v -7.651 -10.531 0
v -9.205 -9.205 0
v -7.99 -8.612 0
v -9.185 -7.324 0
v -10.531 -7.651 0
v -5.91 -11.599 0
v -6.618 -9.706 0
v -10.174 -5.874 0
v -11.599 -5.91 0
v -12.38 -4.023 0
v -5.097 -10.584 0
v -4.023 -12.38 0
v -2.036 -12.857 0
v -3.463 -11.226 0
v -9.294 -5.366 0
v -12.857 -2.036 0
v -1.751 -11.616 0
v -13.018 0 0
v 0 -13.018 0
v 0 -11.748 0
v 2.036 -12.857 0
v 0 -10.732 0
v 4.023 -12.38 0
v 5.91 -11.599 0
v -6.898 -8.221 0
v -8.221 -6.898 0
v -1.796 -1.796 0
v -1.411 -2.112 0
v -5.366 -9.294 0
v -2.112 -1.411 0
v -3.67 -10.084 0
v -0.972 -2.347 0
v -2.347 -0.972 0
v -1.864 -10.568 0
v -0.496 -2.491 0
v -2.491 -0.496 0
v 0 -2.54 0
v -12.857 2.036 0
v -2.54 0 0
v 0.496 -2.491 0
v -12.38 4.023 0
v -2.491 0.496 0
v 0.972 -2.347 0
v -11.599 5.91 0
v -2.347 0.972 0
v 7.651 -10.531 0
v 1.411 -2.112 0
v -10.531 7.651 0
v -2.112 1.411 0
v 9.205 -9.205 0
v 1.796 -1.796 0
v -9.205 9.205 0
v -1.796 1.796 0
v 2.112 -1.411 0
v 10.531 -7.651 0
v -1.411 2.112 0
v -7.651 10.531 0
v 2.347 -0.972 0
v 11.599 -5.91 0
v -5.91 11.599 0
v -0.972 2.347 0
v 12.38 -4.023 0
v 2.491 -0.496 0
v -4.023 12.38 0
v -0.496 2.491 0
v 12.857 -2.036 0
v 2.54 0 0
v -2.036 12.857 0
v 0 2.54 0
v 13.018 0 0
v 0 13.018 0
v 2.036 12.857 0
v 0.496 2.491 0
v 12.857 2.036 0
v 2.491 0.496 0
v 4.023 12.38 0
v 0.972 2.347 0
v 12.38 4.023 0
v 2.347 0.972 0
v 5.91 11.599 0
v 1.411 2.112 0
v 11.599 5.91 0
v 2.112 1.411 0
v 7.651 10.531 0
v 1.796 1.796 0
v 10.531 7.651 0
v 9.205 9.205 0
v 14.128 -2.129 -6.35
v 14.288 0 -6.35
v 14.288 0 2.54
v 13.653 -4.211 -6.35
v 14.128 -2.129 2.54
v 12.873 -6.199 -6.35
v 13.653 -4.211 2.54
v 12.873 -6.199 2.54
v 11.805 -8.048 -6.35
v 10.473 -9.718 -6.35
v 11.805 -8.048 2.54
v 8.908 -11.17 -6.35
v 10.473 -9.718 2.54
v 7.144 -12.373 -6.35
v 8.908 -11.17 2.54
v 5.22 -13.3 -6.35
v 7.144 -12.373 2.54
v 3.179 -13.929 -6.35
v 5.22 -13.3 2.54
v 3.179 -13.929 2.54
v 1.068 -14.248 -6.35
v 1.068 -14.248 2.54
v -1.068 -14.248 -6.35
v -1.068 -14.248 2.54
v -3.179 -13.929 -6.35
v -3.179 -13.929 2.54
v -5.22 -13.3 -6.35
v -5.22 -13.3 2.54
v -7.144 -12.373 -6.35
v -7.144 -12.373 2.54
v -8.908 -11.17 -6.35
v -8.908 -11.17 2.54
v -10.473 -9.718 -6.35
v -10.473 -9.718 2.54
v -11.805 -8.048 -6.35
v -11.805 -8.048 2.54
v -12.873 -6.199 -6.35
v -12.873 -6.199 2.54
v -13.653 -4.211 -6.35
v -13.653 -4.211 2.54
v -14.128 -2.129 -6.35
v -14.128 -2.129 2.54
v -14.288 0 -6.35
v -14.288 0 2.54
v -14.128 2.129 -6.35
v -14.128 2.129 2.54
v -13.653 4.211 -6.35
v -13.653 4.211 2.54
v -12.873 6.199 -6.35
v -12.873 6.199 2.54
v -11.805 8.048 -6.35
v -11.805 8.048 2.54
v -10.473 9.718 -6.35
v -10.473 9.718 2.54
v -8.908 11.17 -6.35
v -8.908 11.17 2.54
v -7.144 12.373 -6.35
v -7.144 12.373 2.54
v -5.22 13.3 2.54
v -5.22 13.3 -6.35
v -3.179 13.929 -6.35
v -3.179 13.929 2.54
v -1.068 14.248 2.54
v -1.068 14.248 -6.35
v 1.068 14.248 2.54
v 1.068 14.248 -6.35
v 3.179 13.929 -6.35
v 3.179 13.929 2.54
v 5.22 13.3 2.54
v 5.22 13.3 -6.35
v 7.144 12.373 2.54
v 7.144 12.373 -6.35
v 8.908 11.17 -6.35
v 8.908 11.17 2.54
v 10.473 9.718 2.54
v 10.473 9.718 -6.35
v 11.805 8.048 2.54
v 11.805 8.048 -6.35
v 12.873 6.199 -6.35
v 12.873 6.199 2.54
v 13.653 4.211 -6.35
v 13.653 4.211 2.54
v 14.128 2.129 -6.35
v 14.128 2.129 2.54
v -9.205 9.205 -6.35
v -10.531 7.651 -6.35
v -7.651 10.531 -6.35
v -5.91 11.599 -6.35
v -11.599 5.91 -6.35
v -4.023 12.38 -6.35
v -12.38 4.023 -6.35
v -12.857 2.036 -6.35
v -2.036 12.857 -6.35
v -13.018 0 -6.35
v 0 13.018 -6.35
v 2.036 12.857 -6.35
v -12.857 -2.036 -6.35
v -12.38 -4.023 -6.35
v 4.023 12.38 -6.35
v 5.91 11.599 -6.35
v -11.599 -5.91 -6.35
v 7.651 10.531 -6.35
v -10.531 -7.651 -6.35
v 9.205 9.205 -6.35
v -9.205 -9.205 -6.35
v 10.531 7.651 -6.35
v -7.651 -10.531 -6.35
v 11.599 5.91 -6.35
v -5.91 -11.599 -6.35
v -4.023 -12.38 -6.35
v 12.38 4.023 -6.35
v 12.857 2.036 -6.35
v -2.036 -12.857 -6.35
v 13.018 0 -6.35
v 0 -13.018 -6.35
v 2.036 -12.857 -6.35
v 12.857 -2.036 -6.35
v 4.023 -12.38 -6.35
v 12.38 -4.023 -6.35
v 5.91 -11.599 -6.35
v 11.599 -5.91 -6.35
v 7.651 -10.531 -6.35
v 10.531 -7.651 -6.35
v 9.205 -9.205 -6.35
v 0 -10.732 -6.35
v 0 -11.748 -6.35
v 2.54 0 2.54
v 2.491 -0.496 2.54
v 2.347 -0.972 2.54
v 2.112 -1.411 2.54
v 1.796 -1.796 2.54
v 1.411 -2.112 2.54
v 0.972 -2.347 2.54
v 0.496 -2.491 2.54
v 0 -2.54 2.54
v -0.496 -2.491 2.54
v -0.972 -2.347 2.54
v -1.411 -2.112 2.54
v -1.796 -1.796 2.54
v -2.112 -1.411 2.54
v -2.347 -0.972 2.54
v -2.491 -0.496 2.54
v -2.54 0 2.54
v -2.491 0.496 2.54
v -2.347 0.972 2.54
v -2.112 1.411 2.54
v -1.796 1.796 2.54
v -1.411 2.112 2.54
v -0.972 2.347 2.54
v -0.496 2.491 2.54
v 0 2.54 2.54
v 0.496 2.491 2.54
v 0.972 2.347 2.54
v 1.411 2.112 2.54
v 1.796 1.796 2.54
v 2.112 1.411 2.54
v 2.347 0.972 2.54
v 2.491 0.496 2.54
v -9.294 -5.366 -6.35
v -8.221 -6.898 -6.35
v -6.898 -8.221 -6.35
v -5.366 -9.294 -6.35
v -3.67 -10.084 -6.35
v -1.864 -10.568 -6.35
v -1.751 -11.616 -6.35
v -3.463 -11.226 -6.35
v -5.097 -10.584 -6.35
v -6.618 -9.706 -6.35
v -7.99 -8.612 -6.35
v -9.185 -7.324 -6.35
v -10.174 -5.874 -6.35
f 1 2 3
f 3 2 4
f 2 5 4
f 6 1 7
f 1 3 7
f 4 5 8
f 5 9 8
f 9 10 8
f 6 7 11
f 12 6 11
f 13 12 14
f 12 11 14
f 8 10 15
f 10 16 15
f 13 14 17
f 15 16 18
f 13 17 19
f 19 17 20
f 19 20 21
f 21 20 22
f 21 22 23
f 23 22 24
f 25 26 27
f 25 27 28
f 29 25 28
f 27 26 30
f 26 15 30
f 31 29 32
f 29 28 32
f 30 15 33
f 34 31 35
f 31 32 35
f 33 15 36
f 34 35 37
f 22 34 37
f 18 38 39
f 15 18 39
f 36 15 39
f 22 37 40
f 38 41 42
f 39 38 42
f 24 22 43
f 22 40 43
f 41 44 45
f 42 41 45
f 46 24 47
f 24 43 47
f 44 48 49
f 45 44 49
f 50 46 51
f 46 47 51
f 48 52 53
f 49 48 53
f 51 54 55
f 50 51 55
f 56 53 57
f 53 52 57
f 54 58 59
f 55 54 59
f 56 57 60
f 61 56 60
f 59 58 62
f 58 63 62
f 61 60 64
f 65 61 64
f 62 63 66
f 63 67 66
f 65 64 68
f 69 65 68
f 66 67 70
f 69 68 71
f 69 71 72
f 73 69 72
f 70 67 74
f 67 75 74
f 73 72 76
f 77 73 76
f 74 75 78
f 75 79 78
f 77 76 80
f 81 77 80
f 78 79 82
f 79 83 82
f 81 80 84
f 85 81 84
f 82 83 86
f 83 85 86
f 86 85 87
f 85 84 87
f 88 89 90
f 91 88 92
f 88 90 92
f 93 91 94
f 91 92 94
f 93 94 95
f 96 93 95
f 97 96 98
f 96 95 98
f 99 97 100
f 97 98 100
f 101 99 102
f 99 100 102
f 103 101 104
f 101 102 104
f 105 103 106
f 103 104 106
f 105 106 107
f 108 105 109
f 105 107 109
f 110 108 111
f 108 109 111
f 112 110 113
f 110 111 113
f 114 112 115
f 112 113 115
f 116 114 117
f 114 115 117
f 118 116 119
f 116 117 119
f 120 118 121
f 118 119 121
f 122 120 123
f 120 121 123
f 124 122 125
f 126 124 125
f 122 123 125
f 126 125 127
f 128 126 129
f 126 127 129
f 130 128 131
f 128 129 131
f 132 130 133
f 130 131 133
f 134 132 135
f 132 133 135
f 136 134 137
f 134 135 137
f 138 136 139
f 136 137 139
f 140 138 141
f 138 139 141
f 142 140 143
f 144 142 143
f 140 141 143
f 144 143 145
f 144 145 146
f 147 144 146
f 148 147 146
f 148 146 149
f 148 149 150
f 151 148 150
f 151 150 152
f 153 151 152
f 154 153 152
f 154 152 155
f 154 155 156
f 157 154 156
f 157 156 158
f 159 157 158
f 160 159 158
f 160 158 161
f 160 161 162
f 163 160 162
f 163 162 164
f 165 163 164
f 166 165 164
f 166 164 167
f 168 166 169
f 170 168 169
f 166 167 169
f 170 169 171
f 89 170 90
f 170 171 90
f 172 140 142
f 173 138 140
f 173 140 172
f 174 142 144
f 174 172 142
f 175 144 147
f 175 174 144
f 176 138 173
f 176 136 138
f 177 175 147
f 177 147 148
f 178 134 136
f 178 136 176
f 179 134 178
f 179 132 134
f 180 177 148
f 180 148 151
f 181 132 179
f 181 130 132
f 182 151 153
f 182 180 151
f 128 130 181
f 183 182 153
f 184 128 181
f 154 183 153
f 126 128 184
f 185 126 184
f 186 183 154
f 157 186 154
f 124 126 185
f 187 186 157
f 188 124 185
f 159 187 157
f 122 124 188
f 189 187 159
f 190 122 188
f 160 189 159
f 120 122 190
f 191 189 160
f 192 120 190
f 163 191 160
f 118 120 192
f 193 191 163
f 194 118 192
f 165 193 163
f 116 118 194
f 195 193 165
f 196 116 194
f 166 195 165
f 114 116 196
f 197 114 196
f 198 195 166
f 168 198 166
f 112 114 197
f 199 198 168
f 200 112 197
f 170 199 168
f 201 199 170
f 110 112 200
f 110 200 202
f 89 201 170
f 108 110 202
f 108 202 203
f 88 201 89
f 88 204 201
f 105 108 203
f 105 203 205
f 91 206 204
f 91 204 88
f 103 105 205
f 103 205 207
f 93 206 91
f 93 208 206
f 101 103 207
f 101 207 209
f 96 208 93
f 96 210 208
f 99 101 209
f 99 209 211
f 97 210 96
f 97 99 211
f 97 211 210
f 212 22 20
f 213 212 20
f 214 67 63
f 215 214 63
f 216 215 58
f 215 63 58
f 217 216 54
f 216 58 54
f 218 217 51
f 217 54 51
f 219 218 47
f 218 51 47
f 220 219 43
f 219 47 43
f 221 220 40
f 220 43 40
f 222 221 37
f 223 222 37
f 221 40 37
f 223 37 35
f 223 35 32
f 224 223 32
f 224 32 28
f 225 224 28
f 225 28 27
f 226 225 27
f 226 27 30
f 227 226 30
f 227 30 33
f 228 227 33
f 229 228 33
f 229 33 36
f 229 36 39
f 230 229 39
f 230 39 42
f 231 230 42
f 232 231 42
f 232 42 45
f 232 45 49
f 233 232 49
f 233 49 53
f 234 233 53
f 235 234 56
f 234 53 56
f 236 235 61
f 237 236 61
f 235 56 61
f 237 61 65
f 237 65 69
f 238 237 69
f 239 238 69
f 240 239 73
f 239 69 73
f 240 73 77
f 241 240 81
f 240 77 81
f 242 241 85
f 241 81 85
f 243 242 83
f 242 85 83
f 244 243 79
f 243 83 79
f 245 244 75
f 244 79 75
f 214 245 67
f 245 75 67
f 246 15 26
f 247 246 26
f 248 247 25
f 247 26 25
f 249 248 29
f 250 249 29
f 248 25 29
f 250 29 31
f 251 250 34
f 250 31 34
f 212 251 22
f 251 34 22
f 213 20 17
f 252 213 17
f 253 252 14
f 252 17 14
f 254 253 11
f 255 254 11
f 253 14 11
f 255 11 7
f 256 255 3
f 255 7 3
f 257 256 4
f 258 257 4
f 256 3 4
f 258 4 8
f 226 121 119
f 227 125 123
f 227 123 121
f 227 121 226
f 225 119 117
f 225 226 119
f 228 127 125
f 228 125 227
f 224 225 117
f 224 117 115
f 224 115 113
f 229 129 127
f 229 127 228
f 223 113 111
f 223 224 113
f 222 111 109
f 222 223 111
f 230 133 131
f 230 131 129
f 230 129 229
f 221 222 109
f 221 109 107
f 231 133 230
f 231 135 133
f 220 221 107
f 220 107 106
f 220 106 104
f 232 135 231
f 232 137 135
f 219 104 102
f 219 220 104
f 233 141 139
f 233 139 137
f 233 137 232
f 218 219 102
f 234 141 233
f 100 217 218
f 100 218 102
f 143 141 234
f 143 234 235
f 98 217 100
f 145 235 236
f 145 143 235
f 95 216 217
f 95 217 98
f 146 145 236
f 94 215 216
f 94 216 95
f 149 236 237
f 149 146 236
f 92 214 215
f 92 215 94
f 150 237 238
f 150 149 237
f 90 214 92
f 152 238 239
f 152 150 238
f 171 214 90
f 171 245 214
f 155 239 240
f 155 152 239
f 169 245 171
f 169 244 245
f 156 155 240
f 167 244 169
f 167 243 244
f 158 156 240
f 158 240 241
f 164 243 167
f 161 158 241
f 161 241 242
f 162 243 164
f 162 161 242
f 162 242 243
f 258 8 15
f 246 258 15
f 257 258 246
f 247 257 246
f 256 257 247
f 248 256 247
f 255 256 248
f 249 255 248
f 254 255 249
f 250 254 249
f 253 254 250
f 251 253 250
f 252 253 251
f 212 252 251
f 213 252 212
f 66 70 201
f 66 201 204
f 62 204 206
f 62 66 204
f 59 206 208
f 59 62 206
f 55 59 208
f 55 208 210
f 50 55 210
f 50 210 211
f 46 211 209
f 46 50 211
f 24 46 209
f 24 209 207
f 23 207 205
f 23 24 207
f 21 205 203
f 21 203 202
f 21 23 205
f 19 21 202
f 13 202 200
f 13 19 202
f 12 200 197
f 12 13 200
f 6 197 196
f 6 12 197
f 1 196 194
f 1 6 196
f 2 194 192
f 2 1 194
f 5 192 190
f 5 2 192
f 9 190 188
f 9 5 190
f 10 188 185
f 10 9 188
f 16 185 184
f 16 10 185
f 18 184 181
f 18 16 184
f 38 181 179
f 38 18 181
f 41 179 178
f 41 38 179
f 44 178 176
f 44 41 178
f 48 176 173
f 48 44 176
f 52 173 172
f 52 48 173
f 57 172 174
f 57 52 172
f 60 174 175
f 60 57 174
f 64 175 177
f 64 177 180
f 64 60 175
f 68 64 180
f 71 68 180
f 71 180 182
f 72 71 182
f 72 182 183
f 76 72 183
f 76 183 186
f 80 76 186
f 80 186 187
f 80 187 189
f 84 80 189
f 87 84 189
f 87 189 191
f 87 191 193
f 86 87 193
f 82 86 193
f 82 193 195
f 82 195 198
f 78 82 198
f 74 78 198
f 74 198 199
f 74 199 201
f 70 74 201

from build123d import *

# Parameters (mm, degrees)
F0_R     = 14.2875
F1_DEPTH = 2.54
F2_R     = 14.2875
F2_R_2   = 13.0175
F3_DEPTH = 6.35
F4_DEPTH = 6.35
F5_R     = 2.54
F6_DEPTH = 25.4


with BuildPart() as f1:
    # F0 (on Top) → F1 (new body)
    with BuildSketch(Plane.XY):
        Circle(F0_R)
    extrude(amount=F1_DEPTH)

    # F2 (on face) → F3 (join)
    with BuildSketch(Plane(origin=(0, 0, 0), x_dir=(1, 0, 0), z_dir=(0, 0, -1))):
        Circle(F2_R)
        Circle(F2_R_2, mode=Mode.SUBTRACT)
    extrude(amount=F3_DEPTH)

    # F2 (on face) → F4 (join, through all)
    with BuildSketch(Plane(origin=(0, 0, 0), x_dir=(1, 0, 0), z_dir=(0, 0, -1))):
        with BuildLine():
            Line((0, 10.7315), (0, 11.7475))
            ThreePointArc((0, 11.7475), (-5.87375, 10.173633), (-10.173633, 5.87375))
            Line((-10.173633, 5.87375), (-9.293752, 5.36575))
            ThreePointArc((-9.293752, 5.36575), (-5.36575, 9.293752), (0, 10.7315))
        make_face()
    extrude(amount=F4_DEPTH)

    # F5 (on face) → F6 (cut)
    with BuildSketch(Plane(origin=(0, 0, 0), x_dir=(1, 0, 0), z_dir=(0, 0, -1))):
        Circle(F5_R)
    extrude(amount=-F6_DEPTH, mode=Mode.SUBTRACT)


solid = f1.part
